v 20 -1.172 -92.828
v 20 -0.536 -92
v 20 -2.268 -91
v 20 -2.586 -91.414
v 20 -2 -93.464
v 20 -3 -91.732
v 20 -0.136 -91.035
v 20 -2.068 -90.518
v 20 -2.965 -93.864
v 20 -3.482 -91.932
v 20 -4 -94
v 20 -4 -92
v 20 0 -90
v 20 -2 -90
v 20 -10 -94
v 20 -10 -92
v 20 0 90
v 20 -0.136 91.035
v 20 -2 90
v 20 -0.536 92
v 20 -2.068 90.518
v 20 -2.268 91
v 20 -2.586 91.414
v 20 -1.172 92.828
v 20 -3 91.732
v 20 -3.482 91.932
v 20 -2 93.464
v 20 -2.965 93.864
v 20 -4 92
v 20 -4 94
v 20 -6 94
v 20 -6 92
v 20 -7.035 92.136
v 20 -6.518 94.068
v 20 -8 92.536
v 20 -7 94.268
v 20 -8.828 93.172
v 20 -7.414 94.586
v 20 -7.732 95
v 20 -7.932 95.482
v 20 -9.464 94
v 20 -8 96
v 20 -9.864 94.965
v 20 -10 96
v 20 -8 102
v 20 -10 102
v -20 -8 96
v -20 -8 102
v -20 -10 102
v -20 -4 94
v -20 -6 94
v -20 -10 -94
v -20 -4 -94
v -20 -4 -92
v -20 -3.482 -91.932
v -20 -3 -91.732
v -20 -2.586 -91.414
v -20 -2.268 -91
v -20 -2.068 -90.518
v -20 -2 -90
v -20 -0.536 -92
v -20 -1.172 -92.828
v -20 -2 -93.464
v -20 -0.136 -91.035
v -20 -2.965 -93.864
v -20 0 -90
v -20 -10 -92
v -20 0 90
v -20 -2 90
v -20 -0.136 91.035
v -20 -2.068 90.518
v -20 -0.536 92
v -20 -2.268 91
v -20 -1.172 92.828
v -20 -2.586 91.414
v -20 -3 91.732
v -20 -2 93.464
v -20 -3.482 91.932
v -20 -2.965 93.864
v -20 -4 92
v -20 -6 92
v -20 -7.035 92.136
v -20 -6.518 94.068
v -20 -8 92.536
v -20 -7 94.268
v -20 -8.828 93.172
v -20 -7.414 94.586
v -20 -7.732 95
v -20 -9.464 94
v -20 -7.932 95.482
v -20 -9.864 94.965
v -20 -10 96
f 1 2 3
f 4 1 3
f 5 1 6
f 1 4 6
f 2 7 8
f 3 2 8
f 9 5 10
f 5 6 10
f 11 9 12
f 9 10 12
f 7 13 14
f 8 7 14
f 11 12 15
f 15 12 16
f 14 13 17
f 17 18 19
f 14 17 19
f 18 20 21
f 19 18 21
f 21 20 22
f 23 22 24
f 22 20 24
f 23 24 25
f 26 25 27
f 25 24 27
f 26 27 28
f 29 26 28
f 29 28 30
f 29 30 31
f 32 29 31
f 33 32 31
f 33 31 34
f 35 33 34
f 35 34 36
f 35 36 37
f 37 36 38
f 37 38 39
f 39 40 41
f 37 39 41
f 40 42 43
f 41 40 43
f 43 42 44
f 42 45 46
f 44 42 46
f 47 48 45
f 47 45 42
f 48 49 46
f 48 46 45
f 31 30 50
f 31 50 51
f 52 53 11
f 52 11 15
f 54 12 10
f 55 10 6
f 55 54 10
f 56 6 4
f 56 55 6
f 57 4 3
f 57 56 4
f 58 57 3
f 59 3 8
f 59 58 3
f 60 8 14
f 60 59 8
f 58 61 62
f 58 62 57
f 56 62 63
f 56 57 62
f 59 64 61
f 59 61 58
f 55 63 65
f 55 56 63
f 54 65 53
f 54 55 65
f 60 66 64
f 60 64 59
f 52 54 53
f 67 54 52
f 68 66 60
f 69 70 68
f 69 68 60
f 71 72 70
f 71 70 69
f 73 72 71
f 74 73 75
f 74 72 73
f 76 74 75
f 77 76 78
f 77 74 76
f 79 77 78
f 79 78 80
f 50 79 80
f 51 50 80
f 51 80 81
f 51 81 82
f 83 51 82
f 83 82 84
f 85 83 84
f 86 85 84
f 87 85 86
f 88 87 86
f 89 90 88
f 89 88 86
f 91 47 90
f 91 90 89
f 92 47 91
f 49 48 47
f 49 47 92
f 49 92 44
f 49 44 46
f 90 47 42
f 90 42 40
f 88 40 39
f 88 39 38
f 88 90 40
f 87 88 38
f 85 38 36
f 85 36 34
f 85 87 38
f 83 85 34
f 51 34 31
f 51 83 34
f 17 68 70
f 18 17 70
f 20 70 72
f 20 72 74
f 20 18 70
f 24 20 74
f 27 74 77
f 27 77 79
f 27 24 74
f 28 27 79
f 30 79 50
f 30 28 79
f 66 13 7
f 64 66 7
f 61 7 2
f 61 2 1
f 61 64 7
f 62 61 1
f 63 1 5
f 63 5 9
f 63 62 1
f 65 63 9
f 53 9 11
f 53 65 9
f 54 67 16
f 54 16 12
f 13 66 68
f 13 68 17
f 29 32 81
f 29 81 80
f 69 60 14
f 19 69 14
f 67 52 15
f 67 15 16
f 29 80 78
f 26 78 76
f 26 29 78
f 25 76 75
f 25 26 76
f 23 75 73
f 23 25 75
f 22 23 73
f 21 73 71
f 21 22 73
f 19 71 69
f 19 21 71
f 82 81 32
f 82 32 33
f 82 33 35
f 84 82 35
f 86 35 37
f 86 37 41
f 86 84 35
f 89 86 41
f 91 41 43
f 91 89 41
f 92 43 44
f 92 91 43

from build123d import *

# Parameters (mm, degrees)
ESBO_O1_W                      = 40
ESBO_O1_H                      = 180
FLANGE_BASE1_DEPTH             = 2
ARESTA_FLANGE1_DEPTH           = 40
ARESTA_FLANGE1_BEND_DEPTH      = 40
ARESTA_FLANGE4_STRIP_W         = 12
ARESTA_FLANGE4_STRIP_H         = 2
ARESTA_FLANGE4_STRIP_CUT_DEPTH = 40
ARESTA_FLANGE4_DEPTH           = 40


# Sheet-metal steps are written as plain solids
with BuildPart() as part:
    # Esboço1 → Flange-base1 (new body)
    with BuildSketch(Plane(origin=(0, 0, 0), x_dir=(1, 0, 0), z_dir=(0, 1, 0))):
        Rectangle(ESBO_O1_W, ESBO_O1_H)
    extrude(amount=-FLANGE_BASE1_DEPTH)

    # Aresta-Flange1 section (across the edge) → Aresta-Flange1 (add)
    with BuildSketch(Plane(origin=(20, -2, 92), x_dir=(0, 0, -1), z_dir=(-1, 0, 0))):
        with BuildLine():
            Line((-2, 2), (-2, 8))
            Line((-2, 8), (0, 8))
            Line((0, 8), (0, 2))
            ThreePointArc((0, 2), (0.585786438, 0.585786438), (2, 0))
            Line((2, 0), (2, -2))
            ThreePointArc((2, -2), (-0.828427125, -0.828427125), (-2, 2))
        make_face()
    extrude(amount=ARESTA_FLANGE1_DEPTH)

    # Aresta-Flange1 section 2 (across the edge) → Aresta-Flange1 bend (add)
    with BuildSketch(Plane(origin=(-20, -2, -92), x_dir=(0, 0, 1), z_dir=(1, 0, 0))):
        with BuildLine():
            Line((-2, 2), (-2, 8))
            Line((-2, 8), (0, 8))
            Line((0, 8), (0, 2))
            ThreePointArc((0, 2), (0.585786438, 0.585786438), (2, 0))
            Line((2, 0), (2, -2))
            ThreePointArc((2, -2), (-0.828427125, -0.828427125), (-2, 2))
        make_face()
    extrude(amount=ARESTA_FLANGE1_BEND_DEPTH)

    # Aresta-Flange4 strip (across the edge) → Aresta-Flange4 strip cut (cut)
    with BuildSketch(Plane(origin=(-20, -10, 94), x_dir=(0, 1, 0), z_dir=(1, 0, 0))):
        with Locations((-2, -1)):
            Rectangle(ARESTA_FLANGE4_STRIP_W, ARESTA_FLANGE4_STRIP_H)
    extrude(amount=ARESTA_FLANGE4_STRIP_CUT_DEPTH, mode=Mode.SUBTRACT)

    # Aresta-Flange4 section (across the edge) → Aresta-Flange4 (add)
    with BuildSketch(Plane(origin=(-20, -10, 94), x_dir=(0, 1, 0), z_dir=(1, 0, 0))):
        with BuildLine():
            Line((0, 2), (0, 8))
            Line((0, 8), (2, 8))
            Line((2, 8), (2, 2))
            ThreePointArc((2, 2), (2.585786438, 0.585786438), (4, 0))
            Line((4, 0), (4, -2))
            ThreePointArc((4, -2), (1.171572875, -0.828427125), (0, 2))
        make_face()
    extrude(amount=ARESTA_FLANGE4_DEPTH)


solid = part.part
